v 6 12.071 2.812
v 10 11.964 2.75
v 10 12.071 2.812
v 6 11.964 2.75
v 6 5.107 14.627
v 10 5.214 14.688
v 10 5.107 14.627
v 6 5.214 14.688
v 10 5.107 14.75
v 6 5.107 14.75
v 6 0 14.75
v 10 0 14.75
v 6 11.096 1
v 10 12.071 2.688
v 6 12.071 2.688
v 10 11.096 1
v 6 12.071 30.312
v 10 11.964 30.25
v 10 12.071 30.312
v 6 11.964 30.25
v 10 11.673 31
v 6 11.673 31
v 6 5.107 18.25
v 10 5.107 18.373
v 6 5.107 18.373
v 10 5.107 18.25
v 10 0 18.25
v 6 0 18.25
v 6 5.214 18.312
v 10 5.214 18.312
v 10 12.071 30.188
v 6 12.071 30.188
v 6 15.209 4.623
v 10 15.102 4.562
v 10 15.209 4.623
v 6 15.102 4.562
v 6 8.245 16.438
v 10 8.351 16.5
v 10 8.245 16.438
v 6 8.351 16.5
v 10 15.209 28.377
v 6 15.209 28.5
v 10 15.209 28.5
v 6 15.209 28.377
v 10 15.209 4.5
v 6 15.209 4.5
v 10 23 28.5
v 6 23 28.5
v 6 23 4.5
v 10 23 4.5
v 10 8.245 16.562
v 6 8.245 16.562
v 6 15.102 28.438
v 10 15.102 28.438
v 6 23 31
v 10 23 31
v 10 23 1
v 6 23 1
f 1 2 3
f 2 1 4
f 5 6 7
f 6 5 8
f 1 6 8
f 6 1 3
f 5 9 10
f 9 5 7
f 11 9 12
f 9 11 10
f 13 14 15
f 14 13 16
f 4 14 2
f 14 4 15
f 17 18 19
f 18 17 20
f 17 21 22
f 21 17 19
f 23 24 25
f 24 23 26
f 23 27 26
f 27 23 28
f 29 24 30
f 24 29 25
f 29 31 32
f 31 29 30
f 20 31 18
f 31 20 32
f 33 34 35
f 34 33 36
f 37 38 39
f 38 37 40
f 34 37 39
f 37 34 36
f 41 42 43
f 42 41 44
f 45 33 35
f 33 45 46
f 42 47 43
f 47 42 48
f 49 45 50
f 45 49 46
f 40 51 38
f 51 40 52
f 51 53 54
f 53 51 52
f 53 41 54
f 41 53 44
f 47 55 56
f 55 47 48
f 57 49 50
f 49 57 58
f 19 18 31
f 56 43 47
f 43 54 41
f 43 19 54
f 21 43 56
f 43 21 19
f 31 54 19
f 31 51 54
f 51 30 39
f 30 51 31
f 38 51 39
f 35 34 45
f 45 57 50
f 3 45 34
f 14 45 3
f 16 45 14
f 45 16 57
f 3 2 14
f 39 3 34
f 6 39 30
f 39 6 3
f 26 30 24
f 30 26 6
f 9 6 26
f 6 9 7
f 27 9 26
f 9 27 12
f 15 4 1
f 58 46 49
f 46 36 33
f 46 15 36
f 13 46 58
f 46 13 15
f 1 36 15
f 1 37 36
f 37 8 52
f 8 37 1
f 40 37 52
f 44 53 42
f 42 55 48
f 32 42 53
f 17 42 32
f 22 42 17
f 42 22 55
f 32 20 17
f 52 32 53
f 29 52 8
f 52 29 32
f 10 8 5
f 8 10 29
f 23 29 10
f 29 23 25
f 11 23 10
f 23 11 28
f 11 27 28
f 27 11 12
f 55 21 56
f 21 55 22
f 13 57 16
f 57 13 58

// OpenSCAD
THICK = 17;
DEEP = 30;
LONG = 20;

module kikicageclip(thick,long,deep){
	difference(){
		translate([1,0,0])
		//cube([thick, deep, long]);
		rotate([90,0,90]){
		//honeycomb(thick+6, long+5,8, 22, 4);
		translate([0,1,5])

			color("blue")honeycomb(thick+6, long,4, 24, 3.5);

		}
}rotate([90,0,90]){
		translate([20,10,-20]);
		//honeycomb(thick, long, 5, 19, 2.5);
	}

}



module hc_hexagon(size, height) {
box_width = size/1.75;
for (r = [-60, 0, 60]) rotate([0,0,r]) cube([box_width, size, height],
true);
}
module hc_column(length, height, cell_size, wall_thickness) {
no_of_cells = floor(1 + length / (cell_size + wall_thickness)) ;
for (i = [0 : no_of_cells]) {
translate([0,(i * (cell_size + wall_thickness)),0])
hc_hexagon(cell_size, height + 1);
}
}
module honeycomb (length, width, height, cell_size, wall_thickness) {
no_of_rows = floor(1.75 * length / (cell_size + wall_thickness)) ;
tr_mod = cell_size + wall_thickness;
tr_x = sqrt(3)/2 * tr_mod;
tr_y = tr_mod / 2;
off_x = -1 * wall_thickness / 2;
off_y = wall_thickness / 2;
difference(){
cube([length, width, height]);
for (i = [0 : no_of_rows]) {
translate([i * tr_x + off_x, (i % 2) * tr_y + off_y, (height) / 2])
hc_column(width, height, cell_size, wall_thickness);
}
}
}
//honeycomb(length, width, height, cell_size, wall_thickness);

//difference(){
//translate([2,0,-15])
kikicageclip(THICK,DEEP,LONG);
//rotate([0,90,0]){

//honeycomb(20, 20, 5, 6, 2.5);}

//}
